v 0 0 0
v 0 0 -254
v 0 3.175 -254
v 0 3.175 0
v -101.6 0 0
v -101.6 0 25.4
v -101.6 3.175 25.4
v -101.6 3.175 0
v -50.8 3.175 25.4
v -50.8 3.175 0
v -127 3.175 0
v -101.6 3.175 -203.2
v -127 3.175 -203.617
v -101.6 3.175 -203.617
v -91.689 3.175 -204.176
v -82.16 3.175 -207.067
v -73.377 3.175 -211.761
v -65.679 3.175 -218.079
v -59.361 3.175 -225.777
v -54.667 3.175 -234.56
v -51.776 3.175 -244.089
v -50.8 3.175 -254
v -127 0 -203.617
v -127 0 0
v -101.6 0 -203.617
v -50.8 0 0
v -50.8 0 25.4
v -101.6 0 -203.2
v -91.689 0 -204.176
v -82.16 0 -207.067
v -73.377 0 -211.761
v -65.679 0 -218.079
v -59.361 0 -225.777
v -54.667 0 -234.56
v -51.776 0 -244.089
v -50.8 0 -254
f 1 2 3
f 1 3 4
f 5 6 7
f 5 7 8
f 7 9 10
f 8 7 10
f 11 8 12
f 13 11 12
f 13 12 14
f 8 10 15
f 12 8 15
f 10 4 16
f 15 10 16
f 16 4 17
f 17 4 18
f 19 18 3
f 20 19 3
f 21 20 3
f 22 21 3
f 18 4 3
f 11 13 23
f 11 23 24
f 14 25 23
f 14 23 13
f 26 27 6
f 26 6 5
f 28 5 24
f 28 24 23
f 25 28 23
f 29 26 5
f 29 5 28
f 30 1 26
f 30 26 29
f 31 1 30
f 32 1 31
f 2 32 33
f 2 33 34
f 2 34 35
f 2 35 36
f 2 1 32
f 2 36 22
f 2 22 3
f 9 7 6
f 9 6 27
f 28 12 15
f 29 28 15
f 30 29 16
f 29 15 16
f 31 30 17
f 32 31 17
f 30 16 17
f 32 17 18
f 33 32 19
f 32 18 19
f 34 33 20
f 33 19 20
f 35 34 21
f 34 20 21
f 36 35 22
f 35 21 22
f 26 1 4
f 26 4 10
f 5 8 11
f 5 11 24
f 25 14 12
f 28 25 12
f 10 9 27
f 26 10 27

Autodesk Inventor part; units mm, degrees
ref_plane "YZ Plane" through (0, 0, 0) normal (1, 0, 0) x (0, 1, 0)
ref_plane "XZ Plane" through (0, 0, 0) normal (0, 1, 0) x (-1, 0, 0)
ref_plane "XY Plane" through (0, 0, 0) normal (0, 0, 1) x (1, 0, 0)
sketch "Sketch1" plane through (0, 0, 0) normal (0, 1, 0) x (-1, 0, 0)
  line L0 (0, 0) -> (101.6, 0)
  line L1 (101.6, 0) -> (101.6, -254)
  line L2 (101.6, -254) -> (0, -254)
  line L3 (0, -254) -> (0, 0)
  dimension "d0" = 254
  dimension "d1" = 101.6
extrude "Extrusion1" add sketch "Sketch1" along normal blind 3.175
sketch "Sketch2" plane through (-101.6, 0, 0) normal (0, 0, 1) x (1, 0, 0)
  line L0 (101.6, 3.175) -> (0, 3.175) projected
  line L1 (101.6, 0) -> (0, 0) projected
  line L2 (0, 3.175) -> (50.8, 3.175)
  line L3 (50.8, 3.175) -> (50.8, 0)
  line L4 (50.8, 0) -> (0, 0)
  line L5 (0, 0) -> (0, 3.175)
extrude "Extrusion2" add sketch "Sketch2" along normal blind 25.4
sketch "Sketch3" plane through (0, 3.175, 0) normal (0, 1, 0) x (1, 0, 0)
  circle A0 centre (-101.6, 254) radius 50.8
  point P0 (0, 0)
  dimension "d6" = 101.6
extrude "Extrusion3" cut sketch "Sketch3" against normal blind 25.4
sketch "Sketch4" plane through (-101.6, 0, -203.2) normal (-1, 0, 0) x (0, 0, 1)
  line L0 (203.2, 3.175) -> (-50.8, 3.175) projected
  line L1 (203.2, 0) -> (-0.4173, 0)
  line L2 (-0.4173, 0) -> (-0.4173, 3.175)
  line L3 (-0.4173, 3.175) -> (203.2, 3.175)
  line L4 (203.2, 3.175) -> (203.2, 0)
extrude "Extrusion4" add sketch "Sketch4" along normal blind 25.4
properties part number "Rotation Board"
